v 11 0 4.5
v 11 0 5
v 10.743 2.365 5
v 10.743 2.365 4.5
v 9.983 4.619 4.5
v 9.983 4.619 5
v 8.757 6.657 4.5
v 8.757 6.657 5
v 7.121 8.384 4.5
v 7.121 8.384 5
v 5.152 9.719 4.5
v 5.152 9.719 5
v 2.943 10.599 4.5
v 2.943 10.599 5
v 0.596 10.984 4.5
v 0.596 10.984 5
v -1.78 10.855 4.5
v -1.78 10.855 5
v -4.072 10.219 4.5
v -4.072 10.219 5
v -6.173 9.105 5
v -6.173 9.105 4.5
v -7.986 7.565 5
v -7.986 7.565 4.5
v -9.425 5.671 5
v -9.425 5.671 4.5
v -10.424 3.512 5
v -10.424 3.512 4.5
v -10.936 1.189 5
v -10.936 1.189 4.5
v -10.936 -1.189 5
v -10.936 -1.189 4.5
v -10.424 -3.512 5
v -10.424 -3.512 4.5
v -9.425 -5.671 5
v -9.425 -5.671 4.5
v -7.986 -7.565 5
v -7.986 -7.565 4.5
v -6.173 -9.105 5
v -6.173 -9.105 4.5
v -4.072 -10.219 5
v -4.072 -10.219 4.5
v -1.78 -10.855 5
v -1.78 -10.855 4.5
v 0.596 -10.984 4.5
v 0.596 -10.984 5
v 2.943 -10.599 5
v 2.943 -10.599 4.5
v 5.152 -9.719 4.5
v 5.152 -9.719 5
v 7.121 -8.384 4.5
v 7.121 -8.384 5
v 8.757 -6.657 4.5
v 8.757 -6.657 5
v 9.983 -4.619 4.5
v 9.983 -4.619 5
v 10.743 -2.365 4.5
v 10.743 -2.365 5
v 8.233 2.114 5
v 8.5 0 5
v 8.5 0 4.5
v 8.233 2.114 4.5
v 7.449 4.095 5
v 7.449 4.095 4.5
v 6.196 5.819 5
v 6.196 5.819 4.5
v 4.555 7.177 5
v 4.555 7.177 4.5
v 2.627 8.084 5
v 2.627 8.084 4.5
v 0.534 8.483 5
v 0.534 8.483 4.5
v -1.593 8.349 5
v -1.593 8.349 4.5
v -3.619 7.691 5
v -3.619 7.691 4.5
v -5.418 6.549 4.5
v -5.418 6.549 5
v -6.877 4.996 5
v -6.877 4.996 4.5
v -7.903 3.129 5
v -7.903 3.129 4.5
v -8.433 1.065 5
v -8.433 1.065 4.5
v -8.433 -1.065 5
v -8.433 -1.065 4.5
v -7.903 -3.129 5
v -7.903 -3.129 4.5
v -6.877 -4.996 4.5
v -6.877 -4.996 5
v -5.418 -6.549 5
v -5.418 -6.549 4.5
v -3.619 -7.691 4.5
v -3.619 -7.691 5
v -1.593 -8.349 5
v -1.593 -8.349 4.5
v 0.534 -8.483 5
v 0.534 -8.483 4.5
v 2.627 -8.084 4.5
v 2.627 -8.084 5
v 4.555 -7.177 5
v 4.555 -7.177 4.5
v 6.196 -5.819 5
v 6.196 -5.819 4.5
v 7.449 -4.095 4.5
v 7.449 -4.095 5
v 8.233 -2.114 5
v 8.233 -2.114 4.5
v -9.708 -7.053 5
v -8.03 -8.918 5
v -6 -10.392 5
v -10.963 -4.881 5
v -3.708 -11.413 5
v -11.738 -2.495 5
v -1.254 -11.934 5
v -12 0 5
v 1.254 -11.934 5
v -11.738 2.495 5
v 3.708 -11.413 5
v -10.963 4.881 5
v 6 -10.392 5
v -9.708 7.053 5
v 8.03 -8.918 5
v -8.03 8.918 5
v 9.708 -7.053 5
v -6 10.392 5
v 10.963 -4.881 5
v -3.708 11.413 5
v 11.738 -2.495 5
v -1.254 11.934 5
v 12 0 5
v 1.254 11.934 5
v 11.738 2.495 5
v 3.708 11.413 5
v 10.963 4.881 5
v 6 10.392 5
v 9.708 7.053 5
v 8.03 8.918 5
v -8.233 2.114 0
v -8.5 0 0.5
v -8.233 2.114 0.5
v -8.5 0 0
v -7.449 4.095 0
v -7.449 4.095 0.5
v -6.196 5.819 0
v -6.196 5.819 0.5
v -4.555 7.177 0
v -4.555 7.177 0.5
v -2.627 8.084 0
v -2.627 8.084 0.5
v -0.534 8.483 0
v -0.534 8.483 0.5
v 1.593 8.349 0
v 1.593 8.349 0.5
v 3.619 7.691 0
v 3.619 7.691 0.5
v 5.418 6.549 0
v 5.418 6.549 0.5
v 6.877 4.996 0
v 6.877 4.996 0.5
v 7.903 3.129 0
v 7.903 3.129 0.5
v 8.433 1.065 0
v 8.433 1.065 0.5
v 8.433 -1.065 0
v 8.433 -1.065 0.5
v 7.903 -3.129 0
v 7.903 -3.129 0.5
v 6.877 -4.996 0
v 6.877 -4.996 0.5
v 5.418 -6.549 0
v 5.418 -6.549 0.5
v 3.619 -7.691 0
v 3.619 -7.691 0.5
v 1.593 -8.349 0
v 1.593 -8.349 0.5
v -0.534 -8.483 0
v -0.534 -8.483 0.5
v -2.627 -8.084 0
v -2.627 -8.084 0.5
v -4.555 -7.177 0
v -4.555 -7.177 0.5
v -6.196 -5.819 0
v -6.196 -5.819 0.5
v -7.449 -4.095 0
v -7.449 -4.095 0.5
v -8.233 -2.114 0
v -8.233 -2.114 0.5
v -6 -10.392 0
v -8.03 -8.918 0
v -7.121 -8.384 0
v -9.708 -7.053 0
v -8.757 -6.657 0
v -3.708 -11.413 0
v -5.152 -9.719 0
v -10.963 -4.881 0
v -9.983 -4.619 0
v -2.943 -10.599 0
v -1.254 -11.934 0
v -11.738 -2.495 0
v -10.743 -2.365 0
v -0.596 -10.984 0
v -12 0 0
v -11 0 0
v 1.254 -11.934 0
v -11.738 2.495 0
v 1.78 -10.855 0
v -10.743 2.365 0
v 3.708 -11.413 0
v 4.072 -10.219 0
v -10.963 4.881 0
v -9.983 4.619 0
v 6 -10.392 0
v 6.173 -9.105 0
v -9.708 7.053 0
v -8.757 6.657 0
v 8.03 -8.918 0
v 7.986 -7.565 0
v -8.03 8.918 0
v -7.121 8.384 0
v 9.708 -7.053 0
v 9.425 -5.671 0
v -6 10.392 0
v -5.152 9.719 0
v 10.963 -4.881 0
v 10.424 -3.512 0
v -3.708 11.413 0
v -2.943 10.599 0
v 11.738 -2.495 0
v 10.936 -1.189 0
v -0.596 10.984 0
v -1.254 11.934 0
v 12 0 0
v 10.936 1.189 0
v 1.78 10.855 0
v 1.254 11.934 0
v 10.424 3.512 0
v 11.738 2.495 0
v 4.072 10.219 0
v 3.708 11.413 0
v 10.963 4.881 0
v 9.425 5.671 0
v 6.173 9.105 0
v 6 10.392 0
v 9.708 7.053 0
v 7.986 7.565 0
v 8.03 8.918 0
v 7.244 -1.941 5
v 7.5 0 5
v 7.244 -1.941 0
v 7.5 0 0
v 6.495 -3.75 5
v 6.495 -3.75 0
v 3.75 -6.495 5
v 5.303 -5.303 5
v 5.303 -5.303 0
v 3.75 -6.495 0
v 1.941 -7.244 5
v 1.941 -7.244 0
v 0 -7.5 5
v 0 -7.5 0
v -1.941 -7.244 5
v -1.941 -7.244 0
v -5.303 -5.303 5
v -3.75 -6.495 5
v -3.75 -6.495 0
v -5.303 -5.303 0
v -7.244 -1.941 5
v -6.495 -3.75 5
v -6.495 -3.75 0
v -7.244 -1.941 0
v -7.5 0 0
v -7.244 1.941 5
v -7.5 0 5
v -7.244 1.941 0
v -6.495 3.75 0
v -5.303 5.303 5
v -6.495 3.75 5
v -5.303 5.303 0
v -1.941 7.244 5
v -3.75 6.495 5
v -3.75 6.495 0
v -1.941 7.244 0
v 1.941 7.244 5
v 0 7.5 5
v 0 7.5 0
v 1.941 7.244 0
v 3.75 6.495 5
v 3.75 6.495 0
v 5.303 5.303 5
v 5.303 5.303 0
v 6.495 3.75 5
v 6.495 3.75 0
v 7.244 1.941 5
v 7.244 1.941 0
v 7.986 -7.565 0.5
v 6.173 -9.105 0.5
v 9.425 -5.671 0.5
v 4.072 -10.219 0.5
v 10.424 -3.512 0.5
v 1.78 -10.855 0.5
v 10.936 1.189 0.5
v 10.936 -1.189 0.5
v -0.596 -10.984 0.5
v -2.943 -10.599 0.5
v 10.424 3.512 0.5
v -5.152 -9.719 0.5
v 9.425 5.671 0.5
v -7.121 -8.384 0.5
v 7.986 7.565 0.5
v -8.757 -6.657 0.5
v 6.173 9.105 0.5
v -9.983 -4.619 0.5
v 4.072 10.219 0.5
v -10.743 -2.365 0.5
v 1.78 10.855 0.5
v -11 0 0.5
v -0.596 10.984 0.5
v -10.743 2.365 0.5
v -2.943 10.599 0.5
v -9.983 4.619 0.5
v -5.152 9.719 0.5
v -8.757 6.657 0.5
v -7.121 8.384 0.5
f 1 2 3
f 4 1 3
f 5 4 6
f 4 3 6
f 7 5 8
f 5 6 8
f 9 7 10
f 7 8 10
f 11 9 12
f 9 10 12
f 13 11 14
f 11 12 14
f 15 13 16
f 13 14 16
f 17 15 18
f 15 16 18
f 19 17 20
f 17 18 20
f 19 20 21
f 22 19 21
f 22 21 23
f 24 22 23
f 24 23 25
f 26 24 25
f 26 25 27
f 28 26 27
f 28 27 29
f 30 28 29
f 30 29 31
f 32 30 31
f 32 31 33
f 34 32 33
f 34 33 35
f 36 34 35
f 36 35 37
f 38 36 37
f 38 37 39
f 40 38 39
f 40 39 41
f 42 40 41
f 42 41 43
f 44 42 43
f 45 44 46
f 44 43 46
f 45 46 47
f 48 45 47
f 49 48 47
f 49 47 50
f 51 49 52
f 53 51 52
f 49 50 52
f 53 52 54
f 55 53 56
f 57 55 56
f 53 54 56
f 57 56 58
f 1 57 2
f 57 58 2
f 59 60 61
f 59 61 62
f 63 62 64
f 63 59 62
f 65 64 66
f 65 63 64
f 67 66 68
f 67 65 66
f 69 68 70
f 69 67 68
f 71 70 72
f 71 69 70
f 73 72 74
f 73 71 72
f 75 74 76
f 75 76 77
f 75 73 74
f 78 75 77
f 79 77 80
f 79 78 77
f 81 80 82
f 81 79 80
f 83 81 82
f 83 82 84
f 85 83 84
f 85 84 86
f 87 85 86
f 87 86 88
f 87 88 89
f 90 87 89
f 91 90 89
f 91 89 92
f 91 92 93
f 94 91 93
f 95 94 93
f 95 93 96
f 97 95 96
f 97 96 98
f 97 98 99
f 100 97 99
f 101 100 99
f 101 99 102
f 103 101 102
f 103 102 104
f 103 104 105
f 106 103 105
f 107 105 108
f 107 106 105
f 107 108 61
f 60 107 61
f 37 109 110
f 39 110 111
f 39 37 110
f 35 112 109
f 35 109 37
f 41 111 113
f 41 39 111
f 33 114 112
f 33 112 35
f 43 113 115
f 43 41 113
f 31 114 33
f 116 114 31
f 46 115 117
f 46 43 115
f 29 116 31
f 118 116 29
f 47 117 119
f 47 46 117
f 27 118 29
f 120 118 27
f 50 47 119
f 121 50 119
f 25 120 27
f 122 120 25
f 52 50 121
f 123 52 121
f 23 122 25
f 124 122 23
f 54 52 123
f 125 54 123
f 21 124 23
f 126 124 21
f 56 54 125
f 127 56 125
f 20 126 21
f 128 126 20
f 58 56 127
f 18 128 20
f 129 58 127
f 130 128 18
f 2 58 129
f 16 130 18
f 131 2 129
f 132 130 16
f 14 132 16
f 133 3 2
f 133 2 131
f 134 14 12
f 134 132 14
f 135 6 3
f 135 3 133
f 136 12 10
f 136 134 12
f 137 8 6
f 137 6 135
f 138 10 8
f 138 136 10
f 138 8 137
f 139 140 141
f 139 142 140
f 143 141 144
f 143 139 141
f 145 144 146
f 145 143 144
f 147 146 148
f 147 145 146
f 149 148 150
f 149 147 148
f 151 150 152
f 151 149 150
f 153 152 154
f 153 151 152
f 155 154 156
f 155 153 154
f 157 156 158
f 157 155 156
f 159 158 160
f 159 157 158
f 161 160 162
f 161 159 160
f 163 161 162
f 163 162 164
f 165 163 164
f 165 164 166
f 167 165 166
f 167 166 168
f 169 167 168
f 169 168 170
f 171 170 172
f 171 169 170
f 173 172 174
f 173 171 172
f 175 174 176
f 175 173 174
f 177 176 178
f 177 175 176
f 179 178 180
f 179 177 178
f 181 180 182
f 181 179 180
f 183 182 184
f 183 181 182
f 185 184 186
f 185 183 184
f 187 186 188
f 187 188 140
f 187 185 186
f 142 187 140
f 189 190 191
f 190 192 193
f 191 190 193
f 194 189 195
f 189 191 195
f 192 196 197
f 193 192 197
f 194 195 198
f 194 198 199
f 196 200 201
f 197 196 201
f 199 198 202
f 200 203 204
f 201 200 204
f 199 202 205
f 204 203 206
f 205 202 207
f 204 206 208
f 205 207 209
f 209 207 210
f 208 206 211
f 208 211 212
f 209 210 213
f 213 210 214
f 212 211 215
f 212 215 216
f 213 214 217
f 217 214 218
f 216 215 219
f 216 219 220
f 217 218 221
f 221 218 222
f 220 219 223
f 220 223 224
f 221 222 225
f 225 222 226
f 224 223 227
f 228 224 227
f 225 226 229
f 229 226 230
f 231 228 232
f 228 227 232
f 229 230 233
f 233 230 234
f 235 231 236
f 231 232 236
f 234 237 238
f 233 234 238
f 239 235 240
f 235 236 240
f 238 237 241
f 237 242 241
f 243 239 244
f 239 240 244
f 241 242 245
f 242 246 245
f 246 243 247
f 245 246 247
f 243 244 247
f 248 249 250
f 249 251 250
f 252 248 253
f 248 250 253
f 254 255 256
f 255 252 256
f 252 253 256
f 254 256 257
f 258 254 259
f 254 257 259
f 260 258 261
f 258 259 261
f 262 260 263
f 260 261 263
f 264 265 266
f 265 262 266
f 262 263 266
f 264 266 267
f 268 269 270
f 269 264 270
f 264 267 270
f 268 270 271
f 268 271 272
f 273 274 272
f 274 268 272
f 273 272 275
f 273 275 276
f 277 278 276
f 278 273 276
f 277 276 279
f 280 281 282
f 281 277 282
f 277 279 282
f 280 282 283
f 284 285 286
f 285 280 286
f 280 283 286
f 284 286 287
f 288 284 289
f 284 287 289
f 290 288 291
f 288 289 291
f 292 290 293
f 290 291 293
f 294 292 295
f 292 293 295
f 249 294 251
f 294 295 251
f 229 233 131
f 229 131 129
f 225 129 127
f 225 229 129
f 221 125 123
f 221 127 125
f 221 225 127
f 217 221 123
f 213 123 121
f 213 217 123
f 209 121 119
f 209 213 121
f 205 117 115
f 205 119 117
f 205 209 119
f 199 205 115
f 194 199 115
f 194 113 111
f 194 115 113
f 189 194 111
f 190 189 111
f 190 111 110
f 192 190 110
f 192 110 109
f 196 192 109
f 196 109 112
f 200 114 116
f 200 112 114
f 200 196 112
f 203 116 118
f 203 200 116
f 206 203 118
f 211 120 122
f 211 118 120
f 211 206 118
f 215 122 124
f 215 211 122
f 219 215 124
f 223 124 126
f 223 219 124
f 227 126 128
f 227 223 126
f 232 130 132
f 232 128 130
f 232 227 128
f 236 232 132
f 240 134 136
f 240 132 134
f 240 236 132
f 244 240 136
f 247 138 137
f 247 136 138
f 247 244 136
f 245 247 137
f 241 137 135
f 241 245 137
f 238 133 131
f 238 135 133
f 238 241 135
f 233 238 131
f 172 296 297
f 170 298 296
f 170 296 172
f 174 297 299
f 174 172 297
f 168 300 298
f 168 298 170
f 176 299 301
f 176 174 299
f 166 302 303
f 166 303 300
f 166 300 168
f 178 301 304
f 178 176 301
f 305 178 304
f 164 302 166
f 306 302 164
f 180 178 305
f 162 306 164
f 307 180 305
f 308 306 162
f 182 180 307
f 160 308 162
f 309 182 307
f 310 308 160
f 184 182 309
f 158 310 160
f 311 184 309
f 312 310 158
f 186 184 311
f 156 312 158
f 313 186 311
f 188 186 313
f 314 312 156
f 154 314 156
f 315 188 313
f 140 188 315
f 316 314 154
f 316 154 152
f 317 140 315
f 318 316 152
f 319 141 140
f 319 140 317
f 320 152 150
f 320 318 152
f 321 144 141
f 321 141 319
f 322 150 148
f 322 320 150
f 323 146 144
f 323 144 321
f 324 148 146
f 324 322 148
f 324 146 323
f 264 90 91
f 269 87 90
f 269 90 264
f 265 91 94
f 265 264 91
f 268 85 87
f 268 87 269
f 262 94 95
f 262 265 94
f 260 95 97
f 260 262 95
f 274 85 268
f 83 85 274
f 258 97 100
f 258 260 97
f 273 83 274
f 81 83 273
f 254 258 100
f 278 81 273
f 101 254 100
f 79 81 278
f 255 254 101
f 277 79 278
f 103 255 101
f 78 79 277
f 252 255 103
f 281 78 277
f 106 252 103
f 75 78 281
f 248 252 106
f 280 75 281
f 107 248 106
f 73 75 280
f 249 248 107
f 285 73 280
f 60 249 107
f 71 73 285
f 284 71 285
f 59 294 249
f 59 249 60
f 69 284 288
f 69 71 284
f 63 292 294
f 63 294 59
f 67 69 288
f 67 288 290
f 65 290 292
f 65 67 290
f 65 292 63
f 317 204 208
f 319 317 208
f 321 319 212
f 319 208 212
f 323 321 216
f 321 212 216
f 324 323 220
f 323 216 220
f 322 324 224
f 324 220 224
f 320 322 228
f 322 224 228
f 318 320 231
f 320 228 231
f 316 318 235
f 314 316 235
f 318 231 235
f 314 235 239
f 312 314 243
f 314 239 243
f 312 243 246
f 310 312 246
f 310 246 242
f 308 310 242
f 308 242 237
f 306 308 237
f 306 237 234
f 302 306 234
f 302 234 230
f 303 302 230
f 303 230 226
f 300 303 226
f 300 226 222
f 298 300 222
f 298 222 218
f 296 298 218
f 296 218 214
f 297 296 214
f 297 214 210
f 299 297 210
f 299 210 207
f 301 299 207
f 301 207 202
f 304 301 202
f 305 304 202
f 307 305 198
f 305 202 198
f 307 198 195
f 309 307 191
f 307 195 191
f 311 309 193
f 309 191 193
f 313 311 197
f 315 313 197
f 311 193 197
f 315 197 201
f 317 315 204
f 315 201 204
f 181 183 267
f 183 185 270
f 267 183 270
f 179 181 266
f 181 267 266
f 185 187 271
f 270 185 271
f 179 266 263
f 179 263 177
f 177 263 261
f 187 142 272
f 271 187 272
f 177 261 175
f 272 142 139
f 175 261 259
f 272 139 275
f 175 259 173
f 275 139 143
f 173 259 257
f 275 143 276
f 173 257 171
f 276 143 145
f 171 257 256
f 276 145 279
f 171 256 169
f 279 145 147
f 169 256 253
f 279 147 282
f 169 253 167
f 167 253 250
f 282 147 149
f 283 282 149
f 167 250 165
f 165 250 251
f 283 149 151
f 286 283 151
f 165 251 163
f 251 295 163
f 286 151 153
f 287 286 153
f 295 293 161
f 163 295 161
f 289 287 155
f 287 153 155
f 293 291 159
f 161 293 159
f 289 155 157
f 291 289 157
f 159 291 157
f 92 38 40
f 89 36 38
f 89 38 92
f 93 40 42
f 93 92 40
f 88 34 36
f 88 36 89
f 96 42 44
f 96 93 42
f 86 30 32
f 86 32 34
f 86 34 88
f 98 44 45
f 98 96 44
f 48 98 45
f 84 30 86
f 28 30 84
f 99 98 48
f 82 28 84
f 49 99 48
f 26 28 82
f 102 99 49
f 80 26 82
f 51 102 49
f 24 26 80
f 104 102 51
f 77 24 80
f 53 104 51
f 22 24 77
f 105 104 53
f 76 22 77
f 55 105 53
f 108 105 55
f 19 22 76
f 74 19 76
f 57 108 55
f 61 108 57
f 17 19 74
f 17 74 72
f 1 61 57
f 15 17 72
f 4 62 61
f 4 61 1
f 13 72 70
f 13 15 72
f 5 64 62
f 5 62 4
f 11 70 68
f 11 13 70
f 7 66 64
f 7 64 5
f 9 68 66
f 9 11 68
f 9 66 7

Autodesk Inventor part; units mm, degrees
ref_plane "YZ Plane" through (0, 0, 0) normal (1, 0, 0) x (0, 1, 0)
ref_plane "XZ Plane" through (0, 0, 0) normal (0, 1, 0) x (-1, 0, 0)
ref_plane "XY Plane" through (0, 0, 0) normal (0, 0, 1) x (1, 0, 0)
sketch "スケッチ1" plane through (0, 0, 0) normal (0, 0, 1) x (1, 0, 0)
  circle A0 centre (0, 0) radius 7.5
  circle A1 centre (0, 0) radius 12
  dimension "d0" = 15
  dimension "d1" = 24
extrude "押し出し1" add sketch "スケッチ1" along normal blind 5
sketch "スケッチ2" plane through (0, 0, 5) normal (0, 0, 1) x (1, 0, 0)
  circle A0 centre (0, 0) radius 7.5 projected
  circle A1 centre (0, 0) radius 12 projected
  circle A2 centre (0, 0) radius 8.5
  circle A3 centre (0, 0) radius 11
  dimension "d4" = 1
  dimension "d5" = 1
extrude "押し出し2" cut sketch "スケッチ2" against normal blind 0.5 contours A3
sketch "スケッチ3" plane through (0, 0, 0) normal (0, 0, -1) x (-1, 0, 0)
  circle A0 centre (0, 0) radius 11 projected
  circle A1 centre (0, 0) radius 8.5 projected
extrude "押し出し3" cut sketch "スケッチ3" against normal blind 0.5
properties part number "ベアリングd15-D24-B5" material "鋼、炭素鋼"
